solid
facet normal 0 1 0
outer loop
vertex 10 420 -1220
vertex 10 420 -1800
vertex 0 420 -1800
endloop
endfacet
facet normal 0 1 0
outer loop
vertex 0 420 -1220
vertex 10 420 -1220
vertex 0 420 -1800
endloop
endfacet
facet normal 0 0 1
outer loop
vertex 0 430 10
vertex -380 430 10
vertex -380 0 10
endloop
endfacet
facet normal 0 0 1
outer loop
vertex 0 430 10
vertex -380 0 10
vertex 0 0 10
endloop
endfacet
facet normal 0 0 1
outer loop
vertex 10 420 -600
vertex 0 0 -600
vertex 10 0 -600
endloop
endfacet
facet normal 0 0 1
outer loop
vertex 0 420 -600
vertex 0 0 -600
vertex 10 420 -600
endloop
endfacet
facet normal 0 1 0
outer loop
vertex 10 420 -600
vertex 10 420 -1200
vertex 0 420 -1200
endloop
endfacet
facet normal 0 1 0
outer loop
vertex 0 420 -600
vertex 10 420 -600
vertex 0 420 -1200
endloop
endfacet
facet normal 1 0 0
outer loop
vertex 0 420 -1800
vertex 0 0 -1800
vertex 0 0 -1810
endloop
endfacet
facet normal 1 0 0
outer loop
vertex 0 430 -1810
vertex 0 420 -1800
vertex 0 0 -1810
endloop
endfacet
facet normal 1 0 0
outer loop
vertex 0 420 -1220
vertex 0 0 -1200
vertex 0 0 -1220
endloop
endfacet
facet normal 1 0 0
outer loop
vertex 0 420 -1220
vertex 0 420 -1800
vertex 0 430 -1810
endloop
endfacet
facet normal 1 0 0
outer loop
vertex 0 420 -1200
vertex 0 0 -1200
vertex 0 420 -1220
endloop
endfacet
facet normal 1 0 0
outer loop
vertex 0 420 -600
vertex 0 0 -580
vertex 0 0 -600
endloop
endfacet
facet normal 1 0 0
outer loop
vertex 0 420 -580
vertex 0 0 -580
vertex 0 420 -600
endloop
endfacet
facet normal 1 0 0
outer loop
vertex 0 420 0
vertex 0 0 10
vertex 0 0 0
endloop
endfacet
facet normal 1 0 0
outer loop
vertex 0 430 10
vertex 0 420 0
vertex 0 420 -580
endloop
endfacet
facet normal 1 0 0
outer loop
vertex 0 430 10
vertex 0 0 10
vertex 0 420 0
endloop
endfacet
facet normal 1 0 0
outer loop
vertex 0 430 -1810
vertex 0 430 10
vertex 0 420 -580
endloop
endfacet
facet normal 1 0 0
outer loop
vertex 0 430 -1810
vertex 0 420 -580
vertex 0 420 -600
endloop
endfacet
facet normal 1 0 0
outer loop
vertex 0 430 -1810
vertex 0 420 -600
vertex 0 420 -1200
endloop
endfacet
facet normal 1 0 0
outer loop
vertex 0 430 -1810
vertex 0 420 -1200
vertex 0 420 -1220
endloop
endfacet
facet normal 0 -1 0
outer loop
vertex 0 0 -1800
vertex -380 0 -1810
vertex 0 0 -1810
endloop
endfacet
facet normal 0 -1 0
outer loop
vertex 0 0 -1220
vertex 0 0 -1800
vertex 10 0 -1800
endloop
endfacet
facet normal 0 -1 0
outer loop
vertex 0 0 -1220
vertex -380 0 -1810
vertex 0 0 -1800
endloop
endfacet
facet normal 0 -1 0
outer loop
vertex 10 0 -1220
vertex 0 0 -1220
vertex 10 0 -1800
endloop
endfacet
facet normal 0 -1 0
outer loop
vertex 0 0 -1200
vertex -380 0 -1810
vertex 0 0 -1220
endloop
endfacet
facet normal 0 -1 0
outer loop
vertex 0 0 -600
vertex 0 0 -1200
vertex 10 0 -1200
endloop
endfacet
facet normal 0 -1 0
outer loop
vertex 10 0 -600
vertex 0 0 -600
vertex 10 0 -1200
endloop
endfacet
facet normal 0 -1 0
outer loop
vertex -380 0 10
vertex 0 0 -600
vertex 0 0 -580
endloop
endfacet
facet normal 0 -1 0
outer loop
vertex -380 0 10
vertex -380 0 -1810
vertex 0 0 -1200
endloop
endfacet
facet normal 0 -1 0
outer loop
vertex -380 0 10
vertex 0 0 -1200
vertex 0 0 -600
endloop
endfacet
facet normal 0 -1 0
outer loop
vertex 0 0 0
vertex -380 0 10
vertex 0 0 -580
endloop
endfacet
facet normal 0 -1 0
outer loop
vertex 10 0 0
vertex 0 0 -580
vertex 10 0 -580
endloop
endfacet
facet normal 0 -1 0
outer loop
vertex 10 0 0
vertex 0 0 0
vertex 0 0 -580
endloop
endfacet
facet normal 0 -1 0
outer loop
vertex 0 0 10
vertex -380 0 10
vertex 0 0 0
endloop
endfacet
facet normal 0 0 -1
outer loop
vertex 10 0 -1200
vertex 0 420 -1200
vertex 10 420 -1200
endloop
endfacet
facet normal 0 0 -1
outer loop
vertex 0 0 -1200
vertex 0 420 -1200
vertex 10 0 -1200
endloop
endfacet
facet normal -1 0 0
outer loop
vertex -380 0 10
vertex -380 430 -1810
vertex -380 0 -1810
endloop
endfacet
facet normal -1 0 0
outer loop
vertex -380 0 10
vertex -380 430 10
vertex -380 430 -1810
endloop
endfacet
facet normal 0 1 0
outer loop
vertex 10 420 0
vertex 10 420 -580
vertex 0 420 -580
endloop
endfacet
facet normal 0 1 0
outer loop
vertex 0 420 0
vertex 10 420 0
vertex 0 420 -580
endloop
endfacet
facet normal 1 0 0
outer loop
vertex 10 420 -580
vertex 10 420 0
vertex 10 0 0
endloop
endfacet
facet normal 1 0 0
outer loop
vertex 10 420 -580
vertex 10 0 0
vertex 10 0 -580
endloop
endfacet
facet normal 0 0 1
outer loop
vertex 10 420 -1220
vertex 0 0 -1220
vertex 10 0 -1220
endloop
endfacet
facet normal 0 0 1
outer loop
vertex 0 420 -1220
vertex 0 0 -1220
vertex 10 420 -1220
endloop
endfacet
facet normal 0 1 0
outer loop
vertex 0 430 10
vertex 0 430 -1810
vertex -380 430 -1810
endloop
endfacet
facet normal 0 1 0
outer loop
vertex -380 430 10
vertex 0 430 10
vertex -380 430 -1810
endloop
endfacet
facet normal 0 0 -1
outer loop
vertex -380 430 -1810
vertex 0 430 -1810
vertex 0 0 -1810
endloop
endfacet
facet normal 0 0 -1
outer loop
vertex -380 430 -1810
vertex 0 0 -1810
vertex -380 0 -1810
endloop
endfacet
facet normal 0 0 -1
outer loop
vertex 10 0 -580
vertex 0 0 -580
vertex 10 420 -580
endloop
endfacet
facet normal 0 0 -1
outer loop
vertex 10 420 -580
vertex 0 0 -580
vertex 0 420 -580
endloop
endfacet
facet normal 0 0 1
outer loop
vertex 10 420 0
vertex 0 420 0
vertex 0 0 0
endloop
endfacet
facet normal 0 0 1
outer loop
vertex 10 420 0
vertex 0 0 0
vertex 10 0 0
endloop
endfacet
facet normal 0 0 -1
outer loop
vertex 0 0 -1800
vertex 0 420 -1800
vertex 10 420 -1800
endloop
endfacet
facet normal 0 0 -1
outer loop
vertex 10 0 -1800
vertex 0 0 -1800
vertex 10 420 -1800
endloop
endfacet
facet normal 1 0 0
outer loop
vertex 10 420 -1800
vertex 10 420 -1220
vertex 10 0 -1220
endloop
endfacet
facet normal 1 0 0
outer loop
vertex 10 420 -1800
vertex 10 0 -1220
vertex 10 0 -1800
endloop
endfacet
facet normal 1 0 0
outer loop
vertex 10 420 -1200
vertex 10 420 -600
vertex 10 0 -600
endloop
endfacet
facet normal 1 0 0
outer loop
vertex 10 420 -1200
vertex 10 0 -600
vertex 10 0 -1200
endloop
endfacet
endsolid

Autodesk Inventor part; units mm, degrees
ref_plane "YZ Plane" through (0, 0, 0) normal (1, 0, 0) x (0, 1, 0)
ref_plane "XZ Plane" through (0, 0, 0) normal (0, 1, 0) x (-1, 0, 0)
ref_plane "XY Plane" through (0, 0, 0) normal (0, 0, 1) x (1, 0, 0)
sketch "Sketch1" plane through (0, 0, 0) normal (0, 1, 0) x (-1, 0, 0)
  line L0 (0, 0) -> (380, 0)
  line L1 (380, 0) -> (380, -1800)
  line L2 (380, -1800) -> (0, -1800)
  line L3 (0, -1800) -> (0, 0)
  dimension "d0" = 380
  dimension "d1" = 1800
extrude "Extrusion1" add sketch "Sketch1" along normal blind 420
sketch "Sketch2" plane through (0, 0, 0) normal (1, 0, 0) x (0, 0, -1)
  line L0 (0, 0) -> (580, 0)
  line L1 (580, 0) -> (580, 420)
  line L2 (580, 420) -> (0, 420)
  line L3 (0, 420) -> (0, 0)
  line L4 (1800, 0) -> (1220, 0)
  line L5 (1220, 0) -> (1220, 420)
  line L6 (1220, 420) -> (1800, 420)
  line L7 (1800, 420) -> (1800, 0)
  line L8 (1800, 420) -> (0, 420) projected
  line L9 (1800, 0) -> (0, 0) projected
  line L10 (600, 420) -> (1200, 420)
  line L11 (1200, 420) -> (1200, 0)
  line L12 (1200, 0) -> (600, 0)
  line L13 (600, 0) -> (600, 420)
  dimension "d4" = 580
  dimension "d6" = 580
  dimension "d7" = 600
extrude "Extrusion2" add sketch "Sketch2" along normal blind 10 contours L3 L2 L1 L0 | L13 L8 L11 L9 | L5 L6 L7 L4
sketch "Sketch3" plane through (0, 420, 0) normal (0, 1, 0) x (1, 0, 0)
  line L0 (-380, 1800) -> (-380, 0) projected
  line L1 (-380, 1800) -> (10, 1800) projected
  line L2 (-380, 0) -> (0, 0)
  line L3 (0, 0) -> (0, 1800)
  line L4 (0, 1800) -> (-380, 1800)
  line L5 (-380, 1800) -> (-380, 0)
extrude "Extrusion3" add sketch "Sketch3" along normal blind 10
sketch "Sketch4" plane through (-380, 0, 0) normal (0, 0, 1) x (1, 0, 0)
  line L0 (0, 0) -> (0, 430) projected
  line L1 (380, 0) -> (380, 420) projected
  line L2 (0, 430) -> (380, 430)
  line L3 (380, 430) -> (380, 0)
  line L4 (380, 0) -> (0, 0)
  line L5 (0, 0) -> (0, 430)
extrude "Extrusion4" add sketch "Sketch4" along normal blind 10
sketch "Sketch5" plane through (10, 0, -1800) normal (0, 0, -1) x (-1, 0, 0)
  line L0 (10, 0) -> (10, 430) projected
  line L1 (390, 0) -> (10, 0) projected
  line L2 (10, 430) -> (390, 430)
  line L3 (390, 430) -> (390, 0)
  line L4 (390, 0) -> (10, 0)
  line L5 (10, 0) -> (10, 430)
extrude "Extrusion5" add sketch "Sketch5" along normal blind 10
properties part number "TVBänk"
